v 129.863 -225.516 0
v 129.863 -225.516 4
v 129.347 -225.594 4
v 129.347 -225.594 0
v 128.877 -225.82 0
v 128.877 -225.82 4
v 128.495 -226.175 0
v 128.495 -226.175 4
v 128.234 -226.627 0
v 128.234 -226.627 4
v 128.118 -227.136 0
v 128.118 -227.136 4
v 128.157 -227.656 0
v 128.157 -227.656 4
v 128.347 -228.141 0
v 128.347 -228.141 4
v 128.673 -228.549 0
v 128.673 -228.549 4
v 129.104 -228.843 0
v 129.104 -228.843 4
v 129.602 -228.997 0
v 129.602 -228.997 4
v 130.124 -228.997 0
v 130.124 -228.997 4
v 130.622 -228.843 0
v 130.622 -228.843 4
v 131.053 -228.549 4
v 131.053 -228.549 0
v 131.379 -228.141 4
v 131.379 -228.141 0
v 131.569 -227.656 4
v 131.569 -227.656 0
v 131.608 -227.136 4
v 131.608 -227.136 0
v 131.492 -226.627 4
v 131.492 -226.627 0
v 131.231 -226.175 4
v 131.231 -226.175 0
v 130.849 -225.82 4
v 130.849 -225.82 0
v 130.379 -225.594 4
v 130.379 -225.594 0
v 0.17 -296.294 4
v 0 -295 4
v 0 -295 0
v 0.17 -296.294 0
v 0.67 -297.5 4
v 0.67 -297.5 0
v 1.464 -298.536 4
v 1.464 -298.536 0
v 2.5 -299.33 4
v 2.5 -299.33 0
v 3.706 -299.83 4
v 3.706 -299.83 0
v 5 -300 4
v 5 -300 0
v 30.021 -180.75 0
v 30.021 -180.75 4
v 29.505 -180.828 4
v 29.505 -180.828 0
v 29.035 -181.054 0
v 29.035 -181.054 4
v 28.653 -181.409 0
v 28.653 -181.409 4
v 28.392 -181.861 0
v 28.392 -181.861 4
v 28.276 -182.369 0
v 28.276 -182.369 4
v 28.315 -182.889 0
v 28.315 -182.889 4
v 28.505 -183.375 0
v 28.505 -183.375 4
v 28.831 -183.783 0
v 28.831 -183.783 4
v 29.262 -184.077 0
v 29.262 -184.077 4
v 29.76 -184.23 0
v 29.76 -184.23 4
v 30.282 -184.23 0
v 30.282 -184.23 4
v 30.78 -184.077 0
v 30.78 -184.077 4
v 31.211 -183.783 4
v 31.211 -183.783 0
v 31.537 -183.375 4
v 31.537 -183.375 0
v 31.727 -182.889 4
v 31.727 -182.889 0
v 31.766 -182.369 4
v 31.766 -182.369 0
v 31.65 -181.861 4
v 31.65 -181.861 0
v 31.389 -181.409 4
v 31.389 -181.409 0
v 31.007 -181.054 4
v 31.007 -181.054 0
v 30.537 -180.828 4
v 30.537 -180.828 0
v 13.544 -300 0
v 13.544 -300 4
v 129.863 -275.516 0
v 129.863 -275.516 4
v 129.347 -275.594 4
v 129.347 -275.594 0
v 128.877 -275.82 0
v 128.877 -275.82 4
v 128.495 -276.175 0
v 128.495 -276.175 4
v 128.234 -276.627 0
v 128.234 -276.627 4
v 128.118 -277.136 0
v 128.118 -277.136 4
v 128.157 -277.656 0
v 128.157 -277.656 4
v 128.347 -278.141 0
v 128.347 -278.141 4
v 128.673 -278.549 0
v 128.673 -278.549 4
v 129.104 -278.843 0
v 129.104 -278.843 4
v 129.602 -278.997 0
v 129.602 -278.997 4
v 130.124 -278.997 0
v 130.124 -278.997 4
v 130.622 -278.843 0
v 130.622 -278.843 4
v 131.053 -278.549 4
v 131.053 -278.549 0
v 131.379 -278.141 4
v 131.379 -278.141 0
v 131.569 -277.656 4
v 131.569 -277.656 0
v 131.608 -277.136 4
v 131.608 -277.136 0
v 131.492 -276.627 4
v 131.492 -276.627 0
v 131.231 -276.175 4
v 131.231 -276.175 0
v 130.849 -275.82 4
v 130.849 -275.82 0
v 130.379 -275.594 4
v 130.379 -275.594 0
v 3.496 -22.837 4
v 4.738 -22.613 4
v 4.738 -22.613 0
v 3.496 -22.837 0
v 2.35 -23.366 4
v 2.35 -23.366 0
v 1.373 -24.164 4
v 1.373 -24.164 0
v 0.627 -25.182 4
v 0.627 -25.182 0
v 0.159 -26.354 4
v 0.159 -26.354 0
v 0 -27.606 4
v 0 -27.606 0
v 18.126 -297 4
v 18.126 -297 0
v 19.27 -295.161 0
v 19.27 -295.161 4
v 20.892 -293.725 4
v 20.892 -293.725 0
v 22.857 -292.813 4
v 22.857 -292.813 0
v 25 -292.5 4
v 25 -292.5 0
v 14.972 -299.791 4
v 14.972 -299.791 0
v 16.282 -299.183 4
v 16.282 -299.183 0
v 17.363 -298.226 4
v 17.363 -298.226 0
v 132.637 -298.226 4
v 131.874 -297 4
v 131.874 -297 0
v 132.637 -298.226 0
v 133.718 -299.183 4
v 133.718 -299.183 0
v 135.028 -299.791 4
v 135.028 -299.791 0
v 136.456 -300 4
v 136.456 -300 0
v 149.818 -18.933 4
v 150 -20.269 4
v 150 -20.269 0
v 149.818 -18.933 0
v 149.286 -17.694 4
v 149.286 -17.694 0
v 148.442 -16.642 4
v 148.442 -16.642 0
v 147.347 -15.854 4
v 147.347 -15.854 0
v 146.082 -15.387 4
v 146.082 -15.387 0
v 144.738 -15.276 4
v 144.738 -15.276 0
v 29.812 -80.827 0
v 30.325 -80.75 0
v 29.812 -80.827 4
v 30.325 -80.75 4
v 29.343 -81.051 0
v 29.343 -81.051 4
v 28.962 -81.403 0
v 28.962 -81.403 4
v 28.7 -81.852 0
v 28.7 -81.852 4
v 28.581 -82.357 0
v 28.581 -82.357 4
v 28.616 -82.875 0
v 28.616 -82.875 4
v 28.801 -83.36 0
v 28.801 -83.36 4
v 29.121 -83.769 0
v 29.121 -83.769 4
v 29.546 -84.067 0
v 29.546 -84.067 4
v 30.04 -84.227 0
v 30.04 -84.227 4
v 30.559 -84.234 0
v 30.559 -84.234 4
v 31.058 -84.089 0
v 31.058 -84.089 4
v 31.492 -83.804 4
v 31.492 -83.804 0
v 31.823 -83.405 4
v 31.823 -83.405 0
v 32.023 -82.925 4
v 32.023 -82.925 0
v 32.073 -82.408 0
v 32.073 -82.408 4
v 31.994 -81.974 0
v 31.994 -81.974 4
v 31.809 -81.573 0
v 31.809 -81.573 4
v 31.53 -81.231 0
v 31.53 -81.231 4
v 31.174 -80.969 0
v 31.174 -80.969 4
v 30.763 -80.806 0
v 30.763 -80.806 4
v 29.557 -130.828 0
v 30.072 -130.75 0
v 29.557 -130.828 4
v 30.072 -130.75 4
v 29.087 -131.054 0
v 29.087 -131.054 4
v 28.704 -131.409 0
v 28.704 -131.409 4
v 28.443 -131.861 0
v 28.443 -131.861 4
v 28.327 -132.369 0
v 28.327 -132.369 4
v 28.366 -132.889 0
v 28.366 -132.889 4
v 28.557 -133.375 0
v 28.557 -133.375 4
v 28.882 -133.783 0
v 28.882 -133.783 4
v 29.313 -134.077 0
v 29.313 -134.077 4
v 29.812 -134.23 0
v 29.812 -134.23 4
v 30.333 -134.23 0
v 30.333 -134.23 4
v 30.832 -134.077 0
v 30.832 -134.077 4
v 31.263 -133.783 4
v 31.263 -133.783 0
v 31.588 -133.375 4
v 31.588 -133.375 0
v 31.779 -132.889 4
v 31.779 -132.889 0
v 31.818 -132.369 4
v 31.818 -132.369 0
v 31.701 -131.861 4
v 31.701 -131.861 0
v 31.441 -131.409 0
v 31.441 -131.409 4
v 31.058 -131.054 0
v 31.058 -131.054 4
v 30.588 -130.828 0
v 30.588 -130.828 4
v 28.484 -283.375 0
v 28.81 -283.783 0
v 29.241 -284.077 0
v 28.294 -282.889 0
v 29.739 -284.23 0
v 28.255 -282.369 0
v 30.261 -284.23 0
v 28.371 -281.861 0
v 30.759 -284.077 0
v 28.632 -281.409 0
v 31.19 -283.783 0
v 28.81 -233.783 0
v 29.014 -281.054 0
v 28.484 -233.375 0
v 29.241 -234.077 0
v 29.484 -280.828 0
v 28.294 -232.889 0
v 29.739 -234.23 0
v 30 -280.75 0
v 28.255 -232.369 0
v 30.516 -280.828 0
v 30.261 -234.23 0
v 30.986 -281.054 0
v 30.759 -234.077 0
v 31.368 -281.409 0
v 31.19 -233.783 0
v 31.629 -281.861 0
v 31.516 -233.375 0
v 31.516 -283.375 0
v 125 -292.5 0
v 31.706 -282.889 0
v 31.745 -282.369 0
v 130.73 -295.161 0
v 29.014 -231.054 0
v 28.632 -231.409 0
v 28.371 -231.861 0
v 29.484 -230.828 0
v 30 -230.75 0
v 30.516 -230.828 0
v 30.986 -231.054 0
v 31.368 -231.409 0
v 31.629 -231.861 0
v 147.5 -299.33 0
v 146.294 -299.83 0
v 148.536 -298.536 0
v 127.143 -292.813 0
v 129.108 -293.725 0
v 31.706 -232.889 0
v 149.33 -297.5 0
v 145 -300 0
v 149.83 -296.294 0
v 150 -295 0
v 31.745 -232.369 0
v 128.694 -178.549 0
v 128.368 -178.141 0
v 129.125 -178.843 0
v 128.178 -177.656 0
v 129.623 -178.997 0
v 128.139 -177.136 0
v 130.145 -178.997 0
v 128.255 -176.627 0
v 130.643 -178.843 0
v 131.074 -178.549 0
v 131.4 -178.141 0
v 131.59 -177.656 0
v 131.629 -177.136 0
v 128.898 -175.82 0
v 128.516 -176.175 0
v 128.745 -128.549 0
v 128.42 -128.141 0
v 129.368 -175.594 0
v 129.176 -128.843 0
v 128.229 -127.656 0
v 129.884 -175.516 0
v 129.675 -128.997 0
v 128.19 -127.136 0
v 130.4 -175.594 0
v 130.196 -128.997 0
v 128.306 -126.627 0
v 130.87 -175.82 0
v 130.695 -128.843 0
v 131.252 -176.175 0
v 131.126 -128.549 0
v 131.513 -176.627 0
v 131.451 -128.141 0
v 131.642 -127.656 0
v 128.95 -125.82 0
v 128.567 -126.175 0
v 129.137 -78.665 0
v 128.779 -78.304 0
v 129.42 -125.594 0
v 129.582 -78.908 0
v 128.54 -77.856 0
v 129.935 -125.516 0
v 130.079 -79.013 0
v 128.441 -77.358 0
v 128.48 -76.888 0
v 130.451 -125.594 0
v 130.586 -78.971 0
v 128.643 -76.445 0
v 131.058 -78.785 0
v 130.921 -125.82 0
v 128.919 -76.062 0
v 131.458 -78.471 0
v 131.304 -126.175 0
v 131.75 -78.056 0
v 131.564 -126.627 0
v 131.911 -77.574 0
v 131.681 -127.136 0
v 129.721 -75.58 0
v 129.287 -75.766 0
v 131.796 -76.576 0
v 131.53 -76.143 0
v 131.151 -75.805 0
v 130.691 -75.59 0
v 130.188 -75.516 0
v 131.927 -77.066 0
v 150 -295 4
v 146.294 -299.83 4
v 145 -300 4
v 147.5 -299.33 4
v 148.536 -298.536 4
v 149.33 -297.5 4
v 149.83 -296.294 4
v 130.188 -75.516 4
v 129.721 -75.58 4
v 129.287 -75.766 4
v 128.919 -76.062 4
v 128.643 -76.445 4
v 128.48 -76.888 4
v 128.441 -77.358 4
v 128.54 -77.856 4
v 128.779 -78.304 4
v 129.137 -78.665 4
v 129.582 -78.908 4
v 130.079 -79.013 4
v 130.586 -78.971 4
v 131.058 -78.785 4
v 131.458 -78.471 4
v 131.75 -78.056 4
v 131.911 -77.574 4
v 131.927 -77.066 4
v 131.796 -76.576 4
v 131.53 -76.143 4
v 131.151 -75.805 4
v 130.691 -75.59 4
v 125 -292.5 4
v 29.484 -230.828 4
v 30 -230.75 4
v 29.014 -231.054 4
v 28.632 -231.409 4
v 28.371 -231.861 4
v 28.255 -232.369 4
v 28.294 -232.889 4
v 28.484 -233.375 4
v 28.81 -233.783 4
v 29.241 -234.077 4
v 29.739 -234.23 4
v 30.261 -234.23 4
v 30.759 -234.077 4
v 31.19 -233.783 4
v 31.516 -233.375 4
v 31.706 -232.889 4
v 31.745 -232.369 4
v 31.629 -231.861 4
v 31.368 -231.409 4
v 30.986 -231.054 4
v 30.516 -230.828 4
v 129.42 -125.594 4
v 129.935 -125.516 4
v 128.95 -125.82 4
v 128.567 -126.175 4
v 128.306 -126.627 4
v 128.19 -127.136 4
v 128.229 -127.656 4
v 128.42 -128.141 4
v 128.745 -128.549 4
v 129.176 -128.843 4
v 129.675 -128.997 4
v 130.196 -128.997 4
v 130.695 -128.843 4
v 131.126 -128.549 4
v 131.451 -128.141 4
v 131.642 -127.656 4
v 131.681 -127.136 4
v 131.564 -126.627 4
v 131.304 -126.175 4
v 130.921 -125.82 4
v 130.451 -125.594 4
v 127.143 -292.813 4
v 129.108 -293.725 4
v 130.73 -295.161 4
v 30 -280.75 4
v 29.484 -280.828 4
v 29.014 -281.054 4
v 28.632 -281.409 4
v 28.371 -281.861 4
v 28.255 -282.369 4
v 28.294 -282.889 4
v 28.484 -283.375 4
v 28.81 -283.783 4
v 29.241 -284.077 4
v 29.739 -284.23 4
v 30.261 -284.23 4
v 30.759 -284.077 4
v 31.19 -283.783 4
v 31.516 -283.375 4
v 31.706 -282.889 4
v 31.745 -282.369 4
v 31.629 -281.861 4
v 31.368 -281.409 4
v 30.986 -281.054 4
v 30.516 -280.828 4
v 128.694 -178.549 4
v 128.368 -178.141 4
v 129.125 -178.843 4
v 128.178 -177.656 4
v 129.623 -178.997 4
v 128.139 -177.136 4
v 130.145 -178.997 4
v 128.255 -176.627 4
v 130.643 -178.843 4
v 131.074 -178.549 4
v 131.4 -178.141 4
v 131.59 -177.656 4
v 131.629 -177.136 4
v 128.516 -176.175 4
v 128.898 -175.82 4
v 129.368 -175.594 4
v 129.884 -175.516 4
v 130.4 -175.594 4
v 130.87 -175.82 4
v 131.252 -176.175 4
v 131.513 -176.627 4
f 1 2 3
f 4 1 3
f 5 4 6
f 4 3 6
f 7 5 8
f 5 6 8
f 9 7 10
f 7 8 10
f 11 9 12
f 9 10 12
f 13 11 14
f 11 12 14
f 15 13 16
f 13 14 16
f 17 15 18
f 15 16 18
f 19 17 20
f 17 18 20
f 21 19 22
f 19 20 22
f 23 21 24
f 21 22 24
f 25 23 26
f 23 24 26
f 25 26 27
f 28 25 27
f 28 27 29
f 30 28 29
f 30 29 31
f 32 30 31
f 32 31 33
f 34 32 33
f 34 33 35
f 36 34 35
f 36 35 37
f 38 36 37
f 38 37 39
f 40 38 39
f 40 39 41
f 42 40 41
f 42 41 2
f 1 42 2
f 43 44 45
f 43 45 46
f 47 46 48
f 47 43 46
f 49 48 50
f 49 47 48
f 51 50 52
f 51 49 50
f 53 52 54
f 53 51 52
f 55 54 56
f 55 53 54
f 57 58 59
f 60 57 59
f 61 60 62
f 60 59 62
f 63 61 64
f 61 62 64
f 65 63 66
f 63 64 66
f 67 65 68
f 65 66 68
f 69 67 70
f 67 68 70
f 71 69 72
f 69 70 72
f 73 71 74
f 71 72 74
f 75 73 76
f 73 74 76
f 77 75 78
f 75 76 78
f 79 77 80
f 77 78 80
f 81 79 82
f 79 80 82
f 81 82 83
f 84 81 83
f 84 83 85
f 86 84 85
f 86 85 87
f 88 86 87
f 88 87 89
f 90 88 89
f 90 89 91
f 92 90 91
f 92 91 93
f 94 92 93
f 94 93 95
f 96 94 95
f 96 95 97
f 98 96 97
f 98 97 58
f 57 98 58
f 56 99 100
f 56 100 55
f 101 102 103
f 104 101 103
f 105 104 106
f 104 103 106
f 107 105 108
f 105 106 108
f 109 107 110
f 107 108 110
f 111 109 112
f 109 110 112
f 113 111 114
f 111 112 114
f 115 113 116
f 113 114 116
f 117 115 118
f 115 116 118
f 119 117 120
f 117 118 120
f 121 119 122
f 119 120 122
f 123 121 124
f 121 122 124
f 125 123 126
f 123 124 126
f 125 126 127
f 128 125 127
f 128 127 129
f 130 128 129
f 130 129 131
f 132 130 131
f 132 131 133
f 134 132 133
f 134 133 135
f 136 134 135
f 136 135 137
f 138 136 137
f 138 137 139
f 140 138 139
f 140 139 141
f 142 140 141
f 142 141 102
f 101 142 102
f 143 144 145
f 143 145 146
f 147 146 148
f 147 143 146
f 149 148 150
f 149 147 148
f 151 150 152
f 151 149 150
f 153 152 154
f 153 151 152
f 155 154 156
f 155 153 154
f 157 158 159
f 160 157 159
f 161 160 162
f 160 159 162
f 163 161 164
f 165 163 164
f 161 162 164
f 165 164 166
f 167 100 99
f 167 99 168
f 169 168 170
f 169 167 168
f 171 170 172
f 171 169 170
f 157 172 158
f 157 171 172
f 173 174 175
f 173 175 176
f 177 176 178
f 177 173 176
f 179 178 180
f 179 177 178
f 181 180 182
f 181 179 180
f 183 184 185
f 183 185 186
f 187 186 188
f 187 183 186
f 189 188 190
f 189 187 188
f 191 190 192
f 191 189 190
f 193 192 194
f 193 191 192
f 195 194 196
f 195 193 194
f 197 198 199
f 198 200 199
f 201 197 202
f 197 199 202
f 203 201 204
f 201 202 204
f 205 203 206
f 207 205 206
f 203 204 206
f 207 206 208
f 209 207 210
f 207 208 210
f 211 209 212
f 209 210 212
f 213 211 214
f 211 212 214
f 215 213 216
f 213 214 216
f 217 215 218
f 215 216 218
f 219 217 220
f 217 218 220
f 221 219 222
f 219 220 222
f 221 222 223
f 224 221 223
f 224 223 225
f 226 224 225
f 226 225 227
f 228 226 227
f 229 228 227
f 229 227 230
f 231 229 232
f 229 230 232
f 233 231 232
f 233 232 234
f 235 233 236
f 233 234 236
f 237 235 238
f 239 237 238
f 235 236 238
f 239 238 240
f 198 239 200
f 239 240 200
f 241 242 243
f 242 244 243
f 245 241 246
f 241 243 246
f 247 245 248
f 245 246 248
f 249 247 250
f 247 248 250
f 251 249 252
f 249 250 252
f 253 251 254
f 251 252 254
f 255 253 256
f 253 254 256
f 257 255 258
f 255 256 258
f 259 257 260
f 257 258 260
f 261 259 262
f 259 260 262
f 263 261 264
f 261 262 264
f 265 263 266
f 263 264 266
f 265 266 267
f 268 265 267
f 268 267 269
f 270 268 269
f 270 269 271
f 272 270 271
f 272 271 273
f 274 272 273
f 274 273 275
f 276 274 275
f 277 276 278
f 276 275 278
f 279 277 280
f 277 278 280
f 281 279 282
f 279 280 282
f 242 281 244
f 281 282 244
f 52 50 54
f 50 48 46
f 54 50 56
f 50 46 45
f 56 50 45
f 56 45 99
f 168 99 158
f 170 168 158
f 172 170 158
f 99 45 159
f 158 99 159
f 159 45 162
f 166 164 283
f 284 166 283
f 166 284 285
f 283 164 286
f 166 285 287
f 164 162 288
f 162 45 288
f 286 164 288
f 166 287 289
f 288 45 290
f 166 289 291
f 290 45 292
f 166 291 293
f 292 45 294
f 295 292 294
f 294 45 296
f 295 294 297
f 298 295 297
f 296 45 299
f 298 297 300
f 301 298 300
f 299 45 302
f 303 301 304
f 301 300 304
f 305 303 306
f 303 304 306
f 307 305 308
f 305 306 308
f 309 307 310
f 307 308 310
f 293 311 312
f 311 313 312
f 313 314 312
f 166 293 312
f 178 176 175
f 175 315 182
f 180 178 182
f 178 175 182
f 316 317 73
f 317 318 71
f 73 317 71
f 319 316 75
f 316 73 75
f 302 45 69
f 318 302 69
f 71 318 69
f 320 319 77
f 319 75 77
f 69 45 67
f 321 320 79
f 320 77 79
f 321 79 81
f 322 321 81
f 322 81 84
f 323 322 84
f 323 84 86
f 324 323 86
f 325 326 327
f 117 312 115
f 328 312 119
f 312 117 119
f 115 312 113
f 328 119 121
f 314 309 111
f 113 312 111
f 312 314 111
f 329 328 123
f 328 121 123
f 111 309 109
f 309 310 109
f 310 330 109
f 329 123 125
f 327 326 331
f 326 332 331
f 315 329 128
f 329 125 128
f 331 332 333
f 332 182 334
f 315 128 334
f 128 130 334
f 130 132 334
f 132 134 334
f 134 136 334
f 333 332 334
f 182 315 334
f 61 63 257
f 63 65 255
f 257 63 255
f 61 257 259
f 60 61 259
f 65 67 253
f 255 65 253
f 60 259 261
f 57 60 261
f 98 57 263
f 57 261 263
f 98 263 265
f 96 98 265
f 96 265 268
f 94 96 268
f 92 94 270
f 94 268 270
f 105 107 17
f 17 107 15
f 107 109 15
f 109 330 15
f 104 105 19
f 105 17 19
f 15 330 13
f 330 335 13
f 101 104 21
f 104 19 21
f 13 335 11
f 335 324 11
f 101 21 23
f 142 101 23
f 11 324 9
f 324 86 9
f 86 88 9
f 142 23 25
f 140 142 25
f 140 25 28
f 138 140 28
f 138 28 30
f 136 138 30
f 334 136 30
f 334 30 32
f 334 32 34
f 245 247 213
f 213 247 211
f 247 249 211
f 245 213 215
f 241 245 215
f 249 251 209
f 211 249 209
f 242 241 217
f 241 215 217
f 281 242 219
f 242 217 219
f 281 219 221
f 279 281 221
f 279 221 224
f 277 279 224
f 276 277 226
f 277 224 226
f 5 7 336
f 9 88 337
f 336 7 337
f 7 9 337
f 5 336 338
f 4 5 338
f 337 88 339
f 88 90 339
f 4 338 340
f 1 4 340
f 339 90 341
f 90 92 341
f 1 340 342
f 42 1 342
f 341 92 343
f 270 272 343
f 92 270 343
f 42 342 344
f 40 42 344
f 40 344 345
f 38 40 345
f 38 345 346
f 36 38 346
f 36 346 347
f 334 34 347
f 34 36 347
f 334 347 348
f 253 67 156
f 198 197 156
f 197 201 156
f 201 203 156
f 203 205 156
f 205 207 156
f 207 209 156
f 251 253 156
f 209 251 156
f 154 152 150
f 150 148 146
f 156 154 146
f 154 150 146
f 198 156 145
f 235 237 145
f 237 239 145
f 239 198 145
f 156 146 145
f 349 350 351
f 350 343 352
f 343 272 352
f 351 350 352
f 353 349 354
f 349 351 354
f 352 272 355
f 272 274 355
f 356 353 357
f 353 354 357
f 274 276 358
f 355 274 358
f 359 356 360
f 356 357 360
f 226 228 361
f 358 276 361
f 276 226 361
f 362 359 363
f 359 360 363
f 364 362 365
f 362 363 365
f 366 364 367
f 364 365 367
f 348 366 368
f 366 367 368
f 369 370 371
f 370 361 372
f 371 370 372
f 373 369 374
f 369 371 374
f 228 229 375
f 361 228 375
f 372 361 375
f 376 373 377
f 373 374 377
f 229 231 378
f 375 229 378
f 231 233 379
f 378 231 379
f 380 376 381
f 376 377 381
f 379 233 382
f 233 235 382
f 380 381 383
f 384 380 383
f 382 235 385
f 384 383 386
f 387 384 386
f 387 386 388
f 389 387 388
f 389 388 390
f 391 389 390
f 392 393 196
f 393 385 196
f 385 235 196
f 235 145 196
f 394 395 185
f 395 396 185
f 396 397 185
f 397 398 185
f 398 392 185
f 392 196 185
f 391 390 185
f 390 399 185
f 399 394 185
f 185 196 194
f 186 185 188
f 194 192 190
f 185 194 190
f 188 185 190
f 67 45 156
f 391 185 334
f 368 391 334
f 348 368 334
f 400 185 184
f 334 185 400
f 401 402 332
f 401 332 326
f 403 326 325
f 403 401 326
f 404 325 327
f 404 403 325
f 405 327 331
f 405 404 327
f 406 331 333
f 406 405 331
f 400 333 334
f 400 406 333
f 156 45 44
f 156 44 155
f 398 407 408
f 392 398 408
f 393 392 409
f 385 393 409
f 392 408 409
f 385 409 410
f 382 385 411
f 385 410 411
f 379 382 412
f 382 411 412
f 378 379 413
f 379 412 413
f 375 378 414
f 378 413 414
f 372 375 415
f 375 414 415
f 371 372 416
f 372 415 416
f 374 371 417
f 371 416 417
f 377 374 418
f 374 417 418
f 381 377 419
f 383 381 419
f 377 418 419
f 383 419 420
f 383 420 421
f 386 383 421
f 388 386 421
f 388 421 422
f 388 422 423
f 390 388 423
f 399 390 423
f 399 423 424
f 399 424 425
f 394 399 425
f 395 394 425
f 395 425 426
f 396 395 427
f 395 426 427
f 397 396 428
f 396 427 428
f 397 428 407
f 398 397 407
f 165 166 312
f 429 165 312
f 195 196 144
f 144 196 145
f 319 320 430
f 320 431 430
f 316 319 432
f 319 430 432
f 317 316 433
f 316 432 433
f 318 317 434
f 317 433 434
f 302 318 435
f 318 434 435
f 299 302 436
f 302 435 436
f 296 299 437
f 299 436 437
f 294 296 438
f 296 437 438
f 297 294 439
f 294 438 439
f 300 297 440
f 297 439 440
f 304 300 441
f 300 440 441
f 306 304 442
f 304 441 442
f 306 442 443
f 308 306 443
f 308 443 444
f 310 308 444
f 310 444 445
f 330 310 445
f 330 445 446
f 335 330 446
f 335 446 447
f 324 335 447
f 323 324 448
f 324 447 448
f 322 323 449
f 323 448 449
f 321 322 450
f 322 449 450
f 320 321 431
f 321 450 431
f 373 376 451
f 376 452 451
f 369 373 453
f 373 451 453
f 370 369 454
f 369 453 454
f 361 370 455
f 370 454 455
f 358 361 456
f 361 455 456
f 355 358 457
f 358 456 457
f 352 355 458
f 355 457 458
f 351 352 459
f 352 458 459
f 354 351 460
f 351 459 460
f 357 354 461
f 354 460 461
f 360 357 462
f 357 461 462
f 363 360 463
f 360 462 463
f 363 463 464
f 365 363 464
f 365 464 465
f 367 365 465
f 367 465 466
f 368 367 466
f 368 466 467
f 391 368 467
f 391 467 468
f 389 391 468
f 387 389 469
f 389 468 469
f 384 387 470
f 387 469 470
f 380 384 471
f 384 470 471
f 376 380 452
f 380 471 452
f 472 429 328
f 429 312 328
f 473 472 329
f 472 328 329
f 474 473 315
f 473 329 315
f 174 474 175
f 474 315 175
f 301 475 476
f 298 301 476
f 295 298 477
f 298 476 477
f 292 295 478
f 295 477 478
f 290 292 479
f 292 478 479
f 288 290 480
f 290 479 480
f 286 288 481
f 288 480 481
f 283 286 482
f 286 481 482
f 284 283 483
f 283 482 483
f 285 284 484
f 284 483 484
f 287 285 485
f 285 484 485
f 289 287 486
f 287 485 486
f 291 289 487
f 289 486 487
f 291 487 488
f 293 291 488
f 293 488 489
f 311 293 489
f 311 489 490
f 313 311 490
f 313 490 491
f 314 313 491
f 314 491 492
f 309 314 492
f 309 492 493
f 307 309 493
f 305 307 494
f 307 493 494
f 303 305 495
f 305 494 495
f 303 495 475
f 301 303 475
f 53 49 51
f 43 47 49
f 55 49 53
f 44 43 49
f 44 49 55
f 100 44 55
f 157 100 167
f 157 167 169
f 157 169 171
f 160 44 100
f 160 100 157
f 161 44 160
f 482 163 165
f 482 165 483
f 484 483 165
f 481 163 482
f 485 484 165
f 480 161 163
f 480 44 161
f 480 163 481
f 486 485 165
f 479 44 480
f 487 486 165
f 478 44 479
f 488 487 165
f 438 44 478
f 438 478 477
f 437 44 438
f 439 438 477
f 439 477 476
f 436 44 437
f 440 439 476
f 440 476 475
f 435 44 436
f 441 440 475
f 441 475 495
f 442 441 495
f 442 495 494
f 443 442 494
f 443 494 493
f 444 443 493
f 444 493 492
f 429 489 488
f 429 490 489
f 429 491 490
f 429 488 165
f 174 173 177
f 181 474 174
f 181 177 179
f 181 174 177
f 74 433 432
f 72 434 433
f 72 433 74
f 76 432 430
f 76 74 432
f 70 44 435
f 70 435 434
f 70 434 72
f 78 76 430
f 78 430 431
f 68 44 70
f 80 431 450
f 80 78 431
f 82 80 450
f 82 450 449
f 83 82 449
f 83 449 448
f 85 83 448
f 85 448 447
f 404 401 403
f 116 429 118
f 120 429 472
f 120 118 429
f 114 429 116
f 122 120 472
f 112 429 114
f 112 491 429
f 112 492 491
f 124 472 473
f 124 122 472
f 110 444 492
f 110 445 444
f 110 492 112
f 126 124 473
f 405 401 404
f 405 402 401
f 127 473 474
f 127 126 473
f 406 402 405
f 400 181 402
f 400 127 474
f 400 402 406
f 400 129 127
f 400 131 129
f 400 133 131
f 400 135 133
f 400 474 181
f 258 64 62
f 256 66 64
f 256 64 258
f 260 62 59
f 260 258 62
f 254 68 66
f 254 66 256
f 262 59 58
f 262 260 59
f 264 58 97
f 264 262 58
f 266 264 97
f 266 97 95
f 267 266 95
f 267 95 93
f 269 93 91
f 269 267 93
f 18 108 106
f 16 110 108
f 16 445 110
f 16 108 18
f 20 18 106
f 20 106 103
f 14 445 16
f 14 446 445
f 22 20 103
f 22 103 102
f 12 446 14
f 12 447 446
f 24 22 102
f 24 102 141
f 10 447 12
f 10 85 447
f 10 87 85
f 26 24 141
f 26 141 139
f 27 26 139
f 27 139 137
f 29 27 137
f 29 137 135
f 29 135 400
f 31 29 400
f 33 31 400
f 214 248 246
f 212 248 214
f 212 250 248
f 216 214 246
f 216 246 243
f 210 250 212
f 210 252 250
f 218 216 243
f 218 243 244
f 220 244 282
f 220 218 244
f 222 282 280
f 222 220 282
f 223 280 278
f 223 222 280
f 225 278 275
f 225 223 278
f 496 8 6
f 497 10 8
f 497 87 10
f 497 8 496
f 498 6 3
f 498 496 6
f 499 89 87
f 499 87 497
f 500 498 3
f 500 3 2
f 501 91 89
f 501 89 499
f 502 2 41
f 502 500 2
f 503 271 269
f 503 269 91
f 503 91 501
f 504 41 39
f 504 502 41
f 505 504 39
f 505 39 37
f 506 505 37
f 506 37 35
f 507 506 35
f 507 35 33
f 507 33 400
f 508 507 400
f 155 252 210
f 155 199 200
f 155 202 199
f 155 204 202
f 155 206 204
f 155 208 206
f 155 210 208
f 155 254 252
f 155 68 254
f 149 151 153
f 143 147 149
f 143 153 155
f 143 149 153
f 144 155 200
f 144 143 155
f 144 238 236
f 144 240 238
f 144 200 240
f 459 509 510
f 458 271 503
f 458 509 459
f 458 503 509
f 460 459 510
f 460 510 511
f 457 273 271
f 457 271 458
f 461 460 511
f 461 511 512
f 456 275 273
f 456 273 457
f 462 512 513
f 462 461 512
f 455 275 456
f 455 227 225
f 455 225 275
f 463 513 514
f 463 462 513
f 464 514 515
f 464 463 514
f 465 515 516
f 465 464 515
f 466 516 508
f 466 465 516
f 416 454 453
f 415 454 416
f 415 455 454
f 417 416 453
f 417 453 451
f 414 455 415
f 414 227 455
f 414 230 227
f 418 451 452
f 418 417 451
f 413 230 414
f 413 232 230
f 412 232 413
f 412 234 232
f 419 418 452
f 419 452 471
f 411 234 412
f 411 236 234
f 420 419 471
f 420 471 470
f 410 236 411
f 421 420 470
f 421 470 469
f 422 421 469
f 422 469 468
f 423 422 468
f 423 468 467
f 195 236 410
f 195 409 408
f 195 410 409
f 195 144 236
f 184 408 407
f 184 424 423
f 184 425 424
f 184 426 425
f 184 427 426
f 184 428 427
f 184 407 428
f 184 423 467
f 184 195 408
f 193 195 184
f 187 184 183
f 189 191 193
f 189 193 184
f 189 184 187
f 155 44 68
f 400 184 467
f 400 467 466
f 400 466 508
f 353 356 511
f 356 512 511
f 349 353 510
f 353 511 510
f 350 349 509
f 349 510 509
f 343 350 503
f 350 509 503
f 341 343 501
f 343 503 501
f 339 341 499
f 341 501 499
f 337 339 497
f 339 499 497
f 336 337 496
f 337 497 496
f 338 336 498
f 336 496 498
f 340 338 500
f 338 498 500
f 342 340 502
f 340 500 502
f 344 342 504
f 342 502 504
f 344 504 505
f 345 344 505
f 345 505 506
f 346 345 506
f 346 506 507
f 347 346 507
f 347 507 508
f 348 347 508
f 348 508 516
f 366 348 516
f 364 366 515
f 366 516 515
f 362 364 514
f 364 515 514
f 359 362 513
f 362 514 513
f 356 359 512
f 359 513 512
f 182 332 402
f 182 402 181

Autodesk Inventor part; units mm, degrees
ref_plane "YZ Plane" through (0, 0, 0) normal (1, 0, 0) x (0, 1, 0)
ref_plane "XZ Plane" through (0, 0, 0) normal (0, 1, 0) x (-1, 0, 0)
ref_plane "XY Plane" through (0, 0, 0) normal (0, 0, 1) x (1, 0, 0)
sketch "スケッチ1" plane through (0, 0, 0) normal (0, 0, 1) x (1, 0, 0)
  line L0 (0, 0) -> (150, 0)
  line L1 (150, 0) -> (150, -300)
  line L2 (150, -300) -> (0, -300)
  line L3 (0, -300) -> (0, 0)
  line L4 (150, -15) -> (0, -22.8612)
  circle A0 centre (130.1882, -77.2664) radius 1.75 projected
  circle A1 centre (30.3252, -82.5) radius 1.75 projected
  line L5 (130.1882, -77.2664) -> (30.3252, -82.5)
  dimension "d2" = 150
  dimension "d3" = 300
  dimension "d68" = 15
extrude "押し出し1" add sketch "スケッチ1" along normal blind 4 contours L4 L1 L2 L3 | A0 | A1
sketch "スケッチ2" plane through (0, 0, 0) normal (0, 0, -1) x (-1, 0, 0)
  line L0 (-125, -300) -> (-25, -300) construction
  line L1 (0, -300) -> (-150, -300) projected
  line L2 (-125, -307.5) -> (-25, -307.5)
  line L3 (-25, -292.5) -> (-125, -292.5)
  arc A0 (-125, -292.5) -> (-125, -307.5) centre (-125, -300) ccw
  arc A1 (-25, -307.5) -> (-25, -292.5) centre (-25, -300) ccw
  point P0 (0, 0)
  point P1 (-75, -300)
  point P2 (-132.5, -300)
  point P3 (-17.5, -300)
  dimension "d4" = 50
  dimension "d5" = 15
extrude "押し出し2" cut sketch "スケッチ2" against normal blind 4 contours L1 A0 L3 A1
fillet "フィレット1" radius 5 4 edges at (150, -300, 2) (132.5, -300, 2) (17.5, -300, 2) (0, -300, 2)
sketch "スケッチ3" plane through (0, 0, 0) normal (0, 0, -1) x (-1, 0, 0)
  line L0 (0, 0) -> (0, -295) projected
  line L1 (-125, -292.5) -> (-25, -292.5) projected
  line L2 (-129.863, -277.2664) -> (-30, -282.5)
  line L3 (-129.9354, -127.2664) -> (-30.0724, -132.5)
  line L4 (-129.884, -177.2664) -> (-30.021, -182.5)
  line L5 (-130.1882, -77.2664) -> (-30.3252, -82.5)
  line L6 (-150, 0) -> (0, 0) projected
  line L7 (-129.863, -227.2664) -> (-30, -232.5)
  dimension "d16" = 30
  dimension "d17" = 10
  dimension "d18" = 100
  dimension "d19" = 3
  dimension "d61" = 50
  dimension "d65" = 50
  dimension "d66" = 50
  dimension "d67" = 50
hole "穴1" at (30, -282.5, 0) at (129.863, -277.2664, 0) at (129.863, -227.2664, 0) at (129.9354, -127.2664, 0) at (30.0724, -132.5, 0) at (129.884, -177.2664, 0) at (30.021, -182.5, 0) at (130.1882, -77.2664, 0) at (30.3252, -82.5, 0) at (30, -232.5, 0) direction (0, 0, 1) diameter 3.5 end through all
fillet "フィレット2" radius 5 2 edges at (150, -15, 2) (0, -22.8612, 2)
properties part number "side_panel" material "木材(サクラ)"
